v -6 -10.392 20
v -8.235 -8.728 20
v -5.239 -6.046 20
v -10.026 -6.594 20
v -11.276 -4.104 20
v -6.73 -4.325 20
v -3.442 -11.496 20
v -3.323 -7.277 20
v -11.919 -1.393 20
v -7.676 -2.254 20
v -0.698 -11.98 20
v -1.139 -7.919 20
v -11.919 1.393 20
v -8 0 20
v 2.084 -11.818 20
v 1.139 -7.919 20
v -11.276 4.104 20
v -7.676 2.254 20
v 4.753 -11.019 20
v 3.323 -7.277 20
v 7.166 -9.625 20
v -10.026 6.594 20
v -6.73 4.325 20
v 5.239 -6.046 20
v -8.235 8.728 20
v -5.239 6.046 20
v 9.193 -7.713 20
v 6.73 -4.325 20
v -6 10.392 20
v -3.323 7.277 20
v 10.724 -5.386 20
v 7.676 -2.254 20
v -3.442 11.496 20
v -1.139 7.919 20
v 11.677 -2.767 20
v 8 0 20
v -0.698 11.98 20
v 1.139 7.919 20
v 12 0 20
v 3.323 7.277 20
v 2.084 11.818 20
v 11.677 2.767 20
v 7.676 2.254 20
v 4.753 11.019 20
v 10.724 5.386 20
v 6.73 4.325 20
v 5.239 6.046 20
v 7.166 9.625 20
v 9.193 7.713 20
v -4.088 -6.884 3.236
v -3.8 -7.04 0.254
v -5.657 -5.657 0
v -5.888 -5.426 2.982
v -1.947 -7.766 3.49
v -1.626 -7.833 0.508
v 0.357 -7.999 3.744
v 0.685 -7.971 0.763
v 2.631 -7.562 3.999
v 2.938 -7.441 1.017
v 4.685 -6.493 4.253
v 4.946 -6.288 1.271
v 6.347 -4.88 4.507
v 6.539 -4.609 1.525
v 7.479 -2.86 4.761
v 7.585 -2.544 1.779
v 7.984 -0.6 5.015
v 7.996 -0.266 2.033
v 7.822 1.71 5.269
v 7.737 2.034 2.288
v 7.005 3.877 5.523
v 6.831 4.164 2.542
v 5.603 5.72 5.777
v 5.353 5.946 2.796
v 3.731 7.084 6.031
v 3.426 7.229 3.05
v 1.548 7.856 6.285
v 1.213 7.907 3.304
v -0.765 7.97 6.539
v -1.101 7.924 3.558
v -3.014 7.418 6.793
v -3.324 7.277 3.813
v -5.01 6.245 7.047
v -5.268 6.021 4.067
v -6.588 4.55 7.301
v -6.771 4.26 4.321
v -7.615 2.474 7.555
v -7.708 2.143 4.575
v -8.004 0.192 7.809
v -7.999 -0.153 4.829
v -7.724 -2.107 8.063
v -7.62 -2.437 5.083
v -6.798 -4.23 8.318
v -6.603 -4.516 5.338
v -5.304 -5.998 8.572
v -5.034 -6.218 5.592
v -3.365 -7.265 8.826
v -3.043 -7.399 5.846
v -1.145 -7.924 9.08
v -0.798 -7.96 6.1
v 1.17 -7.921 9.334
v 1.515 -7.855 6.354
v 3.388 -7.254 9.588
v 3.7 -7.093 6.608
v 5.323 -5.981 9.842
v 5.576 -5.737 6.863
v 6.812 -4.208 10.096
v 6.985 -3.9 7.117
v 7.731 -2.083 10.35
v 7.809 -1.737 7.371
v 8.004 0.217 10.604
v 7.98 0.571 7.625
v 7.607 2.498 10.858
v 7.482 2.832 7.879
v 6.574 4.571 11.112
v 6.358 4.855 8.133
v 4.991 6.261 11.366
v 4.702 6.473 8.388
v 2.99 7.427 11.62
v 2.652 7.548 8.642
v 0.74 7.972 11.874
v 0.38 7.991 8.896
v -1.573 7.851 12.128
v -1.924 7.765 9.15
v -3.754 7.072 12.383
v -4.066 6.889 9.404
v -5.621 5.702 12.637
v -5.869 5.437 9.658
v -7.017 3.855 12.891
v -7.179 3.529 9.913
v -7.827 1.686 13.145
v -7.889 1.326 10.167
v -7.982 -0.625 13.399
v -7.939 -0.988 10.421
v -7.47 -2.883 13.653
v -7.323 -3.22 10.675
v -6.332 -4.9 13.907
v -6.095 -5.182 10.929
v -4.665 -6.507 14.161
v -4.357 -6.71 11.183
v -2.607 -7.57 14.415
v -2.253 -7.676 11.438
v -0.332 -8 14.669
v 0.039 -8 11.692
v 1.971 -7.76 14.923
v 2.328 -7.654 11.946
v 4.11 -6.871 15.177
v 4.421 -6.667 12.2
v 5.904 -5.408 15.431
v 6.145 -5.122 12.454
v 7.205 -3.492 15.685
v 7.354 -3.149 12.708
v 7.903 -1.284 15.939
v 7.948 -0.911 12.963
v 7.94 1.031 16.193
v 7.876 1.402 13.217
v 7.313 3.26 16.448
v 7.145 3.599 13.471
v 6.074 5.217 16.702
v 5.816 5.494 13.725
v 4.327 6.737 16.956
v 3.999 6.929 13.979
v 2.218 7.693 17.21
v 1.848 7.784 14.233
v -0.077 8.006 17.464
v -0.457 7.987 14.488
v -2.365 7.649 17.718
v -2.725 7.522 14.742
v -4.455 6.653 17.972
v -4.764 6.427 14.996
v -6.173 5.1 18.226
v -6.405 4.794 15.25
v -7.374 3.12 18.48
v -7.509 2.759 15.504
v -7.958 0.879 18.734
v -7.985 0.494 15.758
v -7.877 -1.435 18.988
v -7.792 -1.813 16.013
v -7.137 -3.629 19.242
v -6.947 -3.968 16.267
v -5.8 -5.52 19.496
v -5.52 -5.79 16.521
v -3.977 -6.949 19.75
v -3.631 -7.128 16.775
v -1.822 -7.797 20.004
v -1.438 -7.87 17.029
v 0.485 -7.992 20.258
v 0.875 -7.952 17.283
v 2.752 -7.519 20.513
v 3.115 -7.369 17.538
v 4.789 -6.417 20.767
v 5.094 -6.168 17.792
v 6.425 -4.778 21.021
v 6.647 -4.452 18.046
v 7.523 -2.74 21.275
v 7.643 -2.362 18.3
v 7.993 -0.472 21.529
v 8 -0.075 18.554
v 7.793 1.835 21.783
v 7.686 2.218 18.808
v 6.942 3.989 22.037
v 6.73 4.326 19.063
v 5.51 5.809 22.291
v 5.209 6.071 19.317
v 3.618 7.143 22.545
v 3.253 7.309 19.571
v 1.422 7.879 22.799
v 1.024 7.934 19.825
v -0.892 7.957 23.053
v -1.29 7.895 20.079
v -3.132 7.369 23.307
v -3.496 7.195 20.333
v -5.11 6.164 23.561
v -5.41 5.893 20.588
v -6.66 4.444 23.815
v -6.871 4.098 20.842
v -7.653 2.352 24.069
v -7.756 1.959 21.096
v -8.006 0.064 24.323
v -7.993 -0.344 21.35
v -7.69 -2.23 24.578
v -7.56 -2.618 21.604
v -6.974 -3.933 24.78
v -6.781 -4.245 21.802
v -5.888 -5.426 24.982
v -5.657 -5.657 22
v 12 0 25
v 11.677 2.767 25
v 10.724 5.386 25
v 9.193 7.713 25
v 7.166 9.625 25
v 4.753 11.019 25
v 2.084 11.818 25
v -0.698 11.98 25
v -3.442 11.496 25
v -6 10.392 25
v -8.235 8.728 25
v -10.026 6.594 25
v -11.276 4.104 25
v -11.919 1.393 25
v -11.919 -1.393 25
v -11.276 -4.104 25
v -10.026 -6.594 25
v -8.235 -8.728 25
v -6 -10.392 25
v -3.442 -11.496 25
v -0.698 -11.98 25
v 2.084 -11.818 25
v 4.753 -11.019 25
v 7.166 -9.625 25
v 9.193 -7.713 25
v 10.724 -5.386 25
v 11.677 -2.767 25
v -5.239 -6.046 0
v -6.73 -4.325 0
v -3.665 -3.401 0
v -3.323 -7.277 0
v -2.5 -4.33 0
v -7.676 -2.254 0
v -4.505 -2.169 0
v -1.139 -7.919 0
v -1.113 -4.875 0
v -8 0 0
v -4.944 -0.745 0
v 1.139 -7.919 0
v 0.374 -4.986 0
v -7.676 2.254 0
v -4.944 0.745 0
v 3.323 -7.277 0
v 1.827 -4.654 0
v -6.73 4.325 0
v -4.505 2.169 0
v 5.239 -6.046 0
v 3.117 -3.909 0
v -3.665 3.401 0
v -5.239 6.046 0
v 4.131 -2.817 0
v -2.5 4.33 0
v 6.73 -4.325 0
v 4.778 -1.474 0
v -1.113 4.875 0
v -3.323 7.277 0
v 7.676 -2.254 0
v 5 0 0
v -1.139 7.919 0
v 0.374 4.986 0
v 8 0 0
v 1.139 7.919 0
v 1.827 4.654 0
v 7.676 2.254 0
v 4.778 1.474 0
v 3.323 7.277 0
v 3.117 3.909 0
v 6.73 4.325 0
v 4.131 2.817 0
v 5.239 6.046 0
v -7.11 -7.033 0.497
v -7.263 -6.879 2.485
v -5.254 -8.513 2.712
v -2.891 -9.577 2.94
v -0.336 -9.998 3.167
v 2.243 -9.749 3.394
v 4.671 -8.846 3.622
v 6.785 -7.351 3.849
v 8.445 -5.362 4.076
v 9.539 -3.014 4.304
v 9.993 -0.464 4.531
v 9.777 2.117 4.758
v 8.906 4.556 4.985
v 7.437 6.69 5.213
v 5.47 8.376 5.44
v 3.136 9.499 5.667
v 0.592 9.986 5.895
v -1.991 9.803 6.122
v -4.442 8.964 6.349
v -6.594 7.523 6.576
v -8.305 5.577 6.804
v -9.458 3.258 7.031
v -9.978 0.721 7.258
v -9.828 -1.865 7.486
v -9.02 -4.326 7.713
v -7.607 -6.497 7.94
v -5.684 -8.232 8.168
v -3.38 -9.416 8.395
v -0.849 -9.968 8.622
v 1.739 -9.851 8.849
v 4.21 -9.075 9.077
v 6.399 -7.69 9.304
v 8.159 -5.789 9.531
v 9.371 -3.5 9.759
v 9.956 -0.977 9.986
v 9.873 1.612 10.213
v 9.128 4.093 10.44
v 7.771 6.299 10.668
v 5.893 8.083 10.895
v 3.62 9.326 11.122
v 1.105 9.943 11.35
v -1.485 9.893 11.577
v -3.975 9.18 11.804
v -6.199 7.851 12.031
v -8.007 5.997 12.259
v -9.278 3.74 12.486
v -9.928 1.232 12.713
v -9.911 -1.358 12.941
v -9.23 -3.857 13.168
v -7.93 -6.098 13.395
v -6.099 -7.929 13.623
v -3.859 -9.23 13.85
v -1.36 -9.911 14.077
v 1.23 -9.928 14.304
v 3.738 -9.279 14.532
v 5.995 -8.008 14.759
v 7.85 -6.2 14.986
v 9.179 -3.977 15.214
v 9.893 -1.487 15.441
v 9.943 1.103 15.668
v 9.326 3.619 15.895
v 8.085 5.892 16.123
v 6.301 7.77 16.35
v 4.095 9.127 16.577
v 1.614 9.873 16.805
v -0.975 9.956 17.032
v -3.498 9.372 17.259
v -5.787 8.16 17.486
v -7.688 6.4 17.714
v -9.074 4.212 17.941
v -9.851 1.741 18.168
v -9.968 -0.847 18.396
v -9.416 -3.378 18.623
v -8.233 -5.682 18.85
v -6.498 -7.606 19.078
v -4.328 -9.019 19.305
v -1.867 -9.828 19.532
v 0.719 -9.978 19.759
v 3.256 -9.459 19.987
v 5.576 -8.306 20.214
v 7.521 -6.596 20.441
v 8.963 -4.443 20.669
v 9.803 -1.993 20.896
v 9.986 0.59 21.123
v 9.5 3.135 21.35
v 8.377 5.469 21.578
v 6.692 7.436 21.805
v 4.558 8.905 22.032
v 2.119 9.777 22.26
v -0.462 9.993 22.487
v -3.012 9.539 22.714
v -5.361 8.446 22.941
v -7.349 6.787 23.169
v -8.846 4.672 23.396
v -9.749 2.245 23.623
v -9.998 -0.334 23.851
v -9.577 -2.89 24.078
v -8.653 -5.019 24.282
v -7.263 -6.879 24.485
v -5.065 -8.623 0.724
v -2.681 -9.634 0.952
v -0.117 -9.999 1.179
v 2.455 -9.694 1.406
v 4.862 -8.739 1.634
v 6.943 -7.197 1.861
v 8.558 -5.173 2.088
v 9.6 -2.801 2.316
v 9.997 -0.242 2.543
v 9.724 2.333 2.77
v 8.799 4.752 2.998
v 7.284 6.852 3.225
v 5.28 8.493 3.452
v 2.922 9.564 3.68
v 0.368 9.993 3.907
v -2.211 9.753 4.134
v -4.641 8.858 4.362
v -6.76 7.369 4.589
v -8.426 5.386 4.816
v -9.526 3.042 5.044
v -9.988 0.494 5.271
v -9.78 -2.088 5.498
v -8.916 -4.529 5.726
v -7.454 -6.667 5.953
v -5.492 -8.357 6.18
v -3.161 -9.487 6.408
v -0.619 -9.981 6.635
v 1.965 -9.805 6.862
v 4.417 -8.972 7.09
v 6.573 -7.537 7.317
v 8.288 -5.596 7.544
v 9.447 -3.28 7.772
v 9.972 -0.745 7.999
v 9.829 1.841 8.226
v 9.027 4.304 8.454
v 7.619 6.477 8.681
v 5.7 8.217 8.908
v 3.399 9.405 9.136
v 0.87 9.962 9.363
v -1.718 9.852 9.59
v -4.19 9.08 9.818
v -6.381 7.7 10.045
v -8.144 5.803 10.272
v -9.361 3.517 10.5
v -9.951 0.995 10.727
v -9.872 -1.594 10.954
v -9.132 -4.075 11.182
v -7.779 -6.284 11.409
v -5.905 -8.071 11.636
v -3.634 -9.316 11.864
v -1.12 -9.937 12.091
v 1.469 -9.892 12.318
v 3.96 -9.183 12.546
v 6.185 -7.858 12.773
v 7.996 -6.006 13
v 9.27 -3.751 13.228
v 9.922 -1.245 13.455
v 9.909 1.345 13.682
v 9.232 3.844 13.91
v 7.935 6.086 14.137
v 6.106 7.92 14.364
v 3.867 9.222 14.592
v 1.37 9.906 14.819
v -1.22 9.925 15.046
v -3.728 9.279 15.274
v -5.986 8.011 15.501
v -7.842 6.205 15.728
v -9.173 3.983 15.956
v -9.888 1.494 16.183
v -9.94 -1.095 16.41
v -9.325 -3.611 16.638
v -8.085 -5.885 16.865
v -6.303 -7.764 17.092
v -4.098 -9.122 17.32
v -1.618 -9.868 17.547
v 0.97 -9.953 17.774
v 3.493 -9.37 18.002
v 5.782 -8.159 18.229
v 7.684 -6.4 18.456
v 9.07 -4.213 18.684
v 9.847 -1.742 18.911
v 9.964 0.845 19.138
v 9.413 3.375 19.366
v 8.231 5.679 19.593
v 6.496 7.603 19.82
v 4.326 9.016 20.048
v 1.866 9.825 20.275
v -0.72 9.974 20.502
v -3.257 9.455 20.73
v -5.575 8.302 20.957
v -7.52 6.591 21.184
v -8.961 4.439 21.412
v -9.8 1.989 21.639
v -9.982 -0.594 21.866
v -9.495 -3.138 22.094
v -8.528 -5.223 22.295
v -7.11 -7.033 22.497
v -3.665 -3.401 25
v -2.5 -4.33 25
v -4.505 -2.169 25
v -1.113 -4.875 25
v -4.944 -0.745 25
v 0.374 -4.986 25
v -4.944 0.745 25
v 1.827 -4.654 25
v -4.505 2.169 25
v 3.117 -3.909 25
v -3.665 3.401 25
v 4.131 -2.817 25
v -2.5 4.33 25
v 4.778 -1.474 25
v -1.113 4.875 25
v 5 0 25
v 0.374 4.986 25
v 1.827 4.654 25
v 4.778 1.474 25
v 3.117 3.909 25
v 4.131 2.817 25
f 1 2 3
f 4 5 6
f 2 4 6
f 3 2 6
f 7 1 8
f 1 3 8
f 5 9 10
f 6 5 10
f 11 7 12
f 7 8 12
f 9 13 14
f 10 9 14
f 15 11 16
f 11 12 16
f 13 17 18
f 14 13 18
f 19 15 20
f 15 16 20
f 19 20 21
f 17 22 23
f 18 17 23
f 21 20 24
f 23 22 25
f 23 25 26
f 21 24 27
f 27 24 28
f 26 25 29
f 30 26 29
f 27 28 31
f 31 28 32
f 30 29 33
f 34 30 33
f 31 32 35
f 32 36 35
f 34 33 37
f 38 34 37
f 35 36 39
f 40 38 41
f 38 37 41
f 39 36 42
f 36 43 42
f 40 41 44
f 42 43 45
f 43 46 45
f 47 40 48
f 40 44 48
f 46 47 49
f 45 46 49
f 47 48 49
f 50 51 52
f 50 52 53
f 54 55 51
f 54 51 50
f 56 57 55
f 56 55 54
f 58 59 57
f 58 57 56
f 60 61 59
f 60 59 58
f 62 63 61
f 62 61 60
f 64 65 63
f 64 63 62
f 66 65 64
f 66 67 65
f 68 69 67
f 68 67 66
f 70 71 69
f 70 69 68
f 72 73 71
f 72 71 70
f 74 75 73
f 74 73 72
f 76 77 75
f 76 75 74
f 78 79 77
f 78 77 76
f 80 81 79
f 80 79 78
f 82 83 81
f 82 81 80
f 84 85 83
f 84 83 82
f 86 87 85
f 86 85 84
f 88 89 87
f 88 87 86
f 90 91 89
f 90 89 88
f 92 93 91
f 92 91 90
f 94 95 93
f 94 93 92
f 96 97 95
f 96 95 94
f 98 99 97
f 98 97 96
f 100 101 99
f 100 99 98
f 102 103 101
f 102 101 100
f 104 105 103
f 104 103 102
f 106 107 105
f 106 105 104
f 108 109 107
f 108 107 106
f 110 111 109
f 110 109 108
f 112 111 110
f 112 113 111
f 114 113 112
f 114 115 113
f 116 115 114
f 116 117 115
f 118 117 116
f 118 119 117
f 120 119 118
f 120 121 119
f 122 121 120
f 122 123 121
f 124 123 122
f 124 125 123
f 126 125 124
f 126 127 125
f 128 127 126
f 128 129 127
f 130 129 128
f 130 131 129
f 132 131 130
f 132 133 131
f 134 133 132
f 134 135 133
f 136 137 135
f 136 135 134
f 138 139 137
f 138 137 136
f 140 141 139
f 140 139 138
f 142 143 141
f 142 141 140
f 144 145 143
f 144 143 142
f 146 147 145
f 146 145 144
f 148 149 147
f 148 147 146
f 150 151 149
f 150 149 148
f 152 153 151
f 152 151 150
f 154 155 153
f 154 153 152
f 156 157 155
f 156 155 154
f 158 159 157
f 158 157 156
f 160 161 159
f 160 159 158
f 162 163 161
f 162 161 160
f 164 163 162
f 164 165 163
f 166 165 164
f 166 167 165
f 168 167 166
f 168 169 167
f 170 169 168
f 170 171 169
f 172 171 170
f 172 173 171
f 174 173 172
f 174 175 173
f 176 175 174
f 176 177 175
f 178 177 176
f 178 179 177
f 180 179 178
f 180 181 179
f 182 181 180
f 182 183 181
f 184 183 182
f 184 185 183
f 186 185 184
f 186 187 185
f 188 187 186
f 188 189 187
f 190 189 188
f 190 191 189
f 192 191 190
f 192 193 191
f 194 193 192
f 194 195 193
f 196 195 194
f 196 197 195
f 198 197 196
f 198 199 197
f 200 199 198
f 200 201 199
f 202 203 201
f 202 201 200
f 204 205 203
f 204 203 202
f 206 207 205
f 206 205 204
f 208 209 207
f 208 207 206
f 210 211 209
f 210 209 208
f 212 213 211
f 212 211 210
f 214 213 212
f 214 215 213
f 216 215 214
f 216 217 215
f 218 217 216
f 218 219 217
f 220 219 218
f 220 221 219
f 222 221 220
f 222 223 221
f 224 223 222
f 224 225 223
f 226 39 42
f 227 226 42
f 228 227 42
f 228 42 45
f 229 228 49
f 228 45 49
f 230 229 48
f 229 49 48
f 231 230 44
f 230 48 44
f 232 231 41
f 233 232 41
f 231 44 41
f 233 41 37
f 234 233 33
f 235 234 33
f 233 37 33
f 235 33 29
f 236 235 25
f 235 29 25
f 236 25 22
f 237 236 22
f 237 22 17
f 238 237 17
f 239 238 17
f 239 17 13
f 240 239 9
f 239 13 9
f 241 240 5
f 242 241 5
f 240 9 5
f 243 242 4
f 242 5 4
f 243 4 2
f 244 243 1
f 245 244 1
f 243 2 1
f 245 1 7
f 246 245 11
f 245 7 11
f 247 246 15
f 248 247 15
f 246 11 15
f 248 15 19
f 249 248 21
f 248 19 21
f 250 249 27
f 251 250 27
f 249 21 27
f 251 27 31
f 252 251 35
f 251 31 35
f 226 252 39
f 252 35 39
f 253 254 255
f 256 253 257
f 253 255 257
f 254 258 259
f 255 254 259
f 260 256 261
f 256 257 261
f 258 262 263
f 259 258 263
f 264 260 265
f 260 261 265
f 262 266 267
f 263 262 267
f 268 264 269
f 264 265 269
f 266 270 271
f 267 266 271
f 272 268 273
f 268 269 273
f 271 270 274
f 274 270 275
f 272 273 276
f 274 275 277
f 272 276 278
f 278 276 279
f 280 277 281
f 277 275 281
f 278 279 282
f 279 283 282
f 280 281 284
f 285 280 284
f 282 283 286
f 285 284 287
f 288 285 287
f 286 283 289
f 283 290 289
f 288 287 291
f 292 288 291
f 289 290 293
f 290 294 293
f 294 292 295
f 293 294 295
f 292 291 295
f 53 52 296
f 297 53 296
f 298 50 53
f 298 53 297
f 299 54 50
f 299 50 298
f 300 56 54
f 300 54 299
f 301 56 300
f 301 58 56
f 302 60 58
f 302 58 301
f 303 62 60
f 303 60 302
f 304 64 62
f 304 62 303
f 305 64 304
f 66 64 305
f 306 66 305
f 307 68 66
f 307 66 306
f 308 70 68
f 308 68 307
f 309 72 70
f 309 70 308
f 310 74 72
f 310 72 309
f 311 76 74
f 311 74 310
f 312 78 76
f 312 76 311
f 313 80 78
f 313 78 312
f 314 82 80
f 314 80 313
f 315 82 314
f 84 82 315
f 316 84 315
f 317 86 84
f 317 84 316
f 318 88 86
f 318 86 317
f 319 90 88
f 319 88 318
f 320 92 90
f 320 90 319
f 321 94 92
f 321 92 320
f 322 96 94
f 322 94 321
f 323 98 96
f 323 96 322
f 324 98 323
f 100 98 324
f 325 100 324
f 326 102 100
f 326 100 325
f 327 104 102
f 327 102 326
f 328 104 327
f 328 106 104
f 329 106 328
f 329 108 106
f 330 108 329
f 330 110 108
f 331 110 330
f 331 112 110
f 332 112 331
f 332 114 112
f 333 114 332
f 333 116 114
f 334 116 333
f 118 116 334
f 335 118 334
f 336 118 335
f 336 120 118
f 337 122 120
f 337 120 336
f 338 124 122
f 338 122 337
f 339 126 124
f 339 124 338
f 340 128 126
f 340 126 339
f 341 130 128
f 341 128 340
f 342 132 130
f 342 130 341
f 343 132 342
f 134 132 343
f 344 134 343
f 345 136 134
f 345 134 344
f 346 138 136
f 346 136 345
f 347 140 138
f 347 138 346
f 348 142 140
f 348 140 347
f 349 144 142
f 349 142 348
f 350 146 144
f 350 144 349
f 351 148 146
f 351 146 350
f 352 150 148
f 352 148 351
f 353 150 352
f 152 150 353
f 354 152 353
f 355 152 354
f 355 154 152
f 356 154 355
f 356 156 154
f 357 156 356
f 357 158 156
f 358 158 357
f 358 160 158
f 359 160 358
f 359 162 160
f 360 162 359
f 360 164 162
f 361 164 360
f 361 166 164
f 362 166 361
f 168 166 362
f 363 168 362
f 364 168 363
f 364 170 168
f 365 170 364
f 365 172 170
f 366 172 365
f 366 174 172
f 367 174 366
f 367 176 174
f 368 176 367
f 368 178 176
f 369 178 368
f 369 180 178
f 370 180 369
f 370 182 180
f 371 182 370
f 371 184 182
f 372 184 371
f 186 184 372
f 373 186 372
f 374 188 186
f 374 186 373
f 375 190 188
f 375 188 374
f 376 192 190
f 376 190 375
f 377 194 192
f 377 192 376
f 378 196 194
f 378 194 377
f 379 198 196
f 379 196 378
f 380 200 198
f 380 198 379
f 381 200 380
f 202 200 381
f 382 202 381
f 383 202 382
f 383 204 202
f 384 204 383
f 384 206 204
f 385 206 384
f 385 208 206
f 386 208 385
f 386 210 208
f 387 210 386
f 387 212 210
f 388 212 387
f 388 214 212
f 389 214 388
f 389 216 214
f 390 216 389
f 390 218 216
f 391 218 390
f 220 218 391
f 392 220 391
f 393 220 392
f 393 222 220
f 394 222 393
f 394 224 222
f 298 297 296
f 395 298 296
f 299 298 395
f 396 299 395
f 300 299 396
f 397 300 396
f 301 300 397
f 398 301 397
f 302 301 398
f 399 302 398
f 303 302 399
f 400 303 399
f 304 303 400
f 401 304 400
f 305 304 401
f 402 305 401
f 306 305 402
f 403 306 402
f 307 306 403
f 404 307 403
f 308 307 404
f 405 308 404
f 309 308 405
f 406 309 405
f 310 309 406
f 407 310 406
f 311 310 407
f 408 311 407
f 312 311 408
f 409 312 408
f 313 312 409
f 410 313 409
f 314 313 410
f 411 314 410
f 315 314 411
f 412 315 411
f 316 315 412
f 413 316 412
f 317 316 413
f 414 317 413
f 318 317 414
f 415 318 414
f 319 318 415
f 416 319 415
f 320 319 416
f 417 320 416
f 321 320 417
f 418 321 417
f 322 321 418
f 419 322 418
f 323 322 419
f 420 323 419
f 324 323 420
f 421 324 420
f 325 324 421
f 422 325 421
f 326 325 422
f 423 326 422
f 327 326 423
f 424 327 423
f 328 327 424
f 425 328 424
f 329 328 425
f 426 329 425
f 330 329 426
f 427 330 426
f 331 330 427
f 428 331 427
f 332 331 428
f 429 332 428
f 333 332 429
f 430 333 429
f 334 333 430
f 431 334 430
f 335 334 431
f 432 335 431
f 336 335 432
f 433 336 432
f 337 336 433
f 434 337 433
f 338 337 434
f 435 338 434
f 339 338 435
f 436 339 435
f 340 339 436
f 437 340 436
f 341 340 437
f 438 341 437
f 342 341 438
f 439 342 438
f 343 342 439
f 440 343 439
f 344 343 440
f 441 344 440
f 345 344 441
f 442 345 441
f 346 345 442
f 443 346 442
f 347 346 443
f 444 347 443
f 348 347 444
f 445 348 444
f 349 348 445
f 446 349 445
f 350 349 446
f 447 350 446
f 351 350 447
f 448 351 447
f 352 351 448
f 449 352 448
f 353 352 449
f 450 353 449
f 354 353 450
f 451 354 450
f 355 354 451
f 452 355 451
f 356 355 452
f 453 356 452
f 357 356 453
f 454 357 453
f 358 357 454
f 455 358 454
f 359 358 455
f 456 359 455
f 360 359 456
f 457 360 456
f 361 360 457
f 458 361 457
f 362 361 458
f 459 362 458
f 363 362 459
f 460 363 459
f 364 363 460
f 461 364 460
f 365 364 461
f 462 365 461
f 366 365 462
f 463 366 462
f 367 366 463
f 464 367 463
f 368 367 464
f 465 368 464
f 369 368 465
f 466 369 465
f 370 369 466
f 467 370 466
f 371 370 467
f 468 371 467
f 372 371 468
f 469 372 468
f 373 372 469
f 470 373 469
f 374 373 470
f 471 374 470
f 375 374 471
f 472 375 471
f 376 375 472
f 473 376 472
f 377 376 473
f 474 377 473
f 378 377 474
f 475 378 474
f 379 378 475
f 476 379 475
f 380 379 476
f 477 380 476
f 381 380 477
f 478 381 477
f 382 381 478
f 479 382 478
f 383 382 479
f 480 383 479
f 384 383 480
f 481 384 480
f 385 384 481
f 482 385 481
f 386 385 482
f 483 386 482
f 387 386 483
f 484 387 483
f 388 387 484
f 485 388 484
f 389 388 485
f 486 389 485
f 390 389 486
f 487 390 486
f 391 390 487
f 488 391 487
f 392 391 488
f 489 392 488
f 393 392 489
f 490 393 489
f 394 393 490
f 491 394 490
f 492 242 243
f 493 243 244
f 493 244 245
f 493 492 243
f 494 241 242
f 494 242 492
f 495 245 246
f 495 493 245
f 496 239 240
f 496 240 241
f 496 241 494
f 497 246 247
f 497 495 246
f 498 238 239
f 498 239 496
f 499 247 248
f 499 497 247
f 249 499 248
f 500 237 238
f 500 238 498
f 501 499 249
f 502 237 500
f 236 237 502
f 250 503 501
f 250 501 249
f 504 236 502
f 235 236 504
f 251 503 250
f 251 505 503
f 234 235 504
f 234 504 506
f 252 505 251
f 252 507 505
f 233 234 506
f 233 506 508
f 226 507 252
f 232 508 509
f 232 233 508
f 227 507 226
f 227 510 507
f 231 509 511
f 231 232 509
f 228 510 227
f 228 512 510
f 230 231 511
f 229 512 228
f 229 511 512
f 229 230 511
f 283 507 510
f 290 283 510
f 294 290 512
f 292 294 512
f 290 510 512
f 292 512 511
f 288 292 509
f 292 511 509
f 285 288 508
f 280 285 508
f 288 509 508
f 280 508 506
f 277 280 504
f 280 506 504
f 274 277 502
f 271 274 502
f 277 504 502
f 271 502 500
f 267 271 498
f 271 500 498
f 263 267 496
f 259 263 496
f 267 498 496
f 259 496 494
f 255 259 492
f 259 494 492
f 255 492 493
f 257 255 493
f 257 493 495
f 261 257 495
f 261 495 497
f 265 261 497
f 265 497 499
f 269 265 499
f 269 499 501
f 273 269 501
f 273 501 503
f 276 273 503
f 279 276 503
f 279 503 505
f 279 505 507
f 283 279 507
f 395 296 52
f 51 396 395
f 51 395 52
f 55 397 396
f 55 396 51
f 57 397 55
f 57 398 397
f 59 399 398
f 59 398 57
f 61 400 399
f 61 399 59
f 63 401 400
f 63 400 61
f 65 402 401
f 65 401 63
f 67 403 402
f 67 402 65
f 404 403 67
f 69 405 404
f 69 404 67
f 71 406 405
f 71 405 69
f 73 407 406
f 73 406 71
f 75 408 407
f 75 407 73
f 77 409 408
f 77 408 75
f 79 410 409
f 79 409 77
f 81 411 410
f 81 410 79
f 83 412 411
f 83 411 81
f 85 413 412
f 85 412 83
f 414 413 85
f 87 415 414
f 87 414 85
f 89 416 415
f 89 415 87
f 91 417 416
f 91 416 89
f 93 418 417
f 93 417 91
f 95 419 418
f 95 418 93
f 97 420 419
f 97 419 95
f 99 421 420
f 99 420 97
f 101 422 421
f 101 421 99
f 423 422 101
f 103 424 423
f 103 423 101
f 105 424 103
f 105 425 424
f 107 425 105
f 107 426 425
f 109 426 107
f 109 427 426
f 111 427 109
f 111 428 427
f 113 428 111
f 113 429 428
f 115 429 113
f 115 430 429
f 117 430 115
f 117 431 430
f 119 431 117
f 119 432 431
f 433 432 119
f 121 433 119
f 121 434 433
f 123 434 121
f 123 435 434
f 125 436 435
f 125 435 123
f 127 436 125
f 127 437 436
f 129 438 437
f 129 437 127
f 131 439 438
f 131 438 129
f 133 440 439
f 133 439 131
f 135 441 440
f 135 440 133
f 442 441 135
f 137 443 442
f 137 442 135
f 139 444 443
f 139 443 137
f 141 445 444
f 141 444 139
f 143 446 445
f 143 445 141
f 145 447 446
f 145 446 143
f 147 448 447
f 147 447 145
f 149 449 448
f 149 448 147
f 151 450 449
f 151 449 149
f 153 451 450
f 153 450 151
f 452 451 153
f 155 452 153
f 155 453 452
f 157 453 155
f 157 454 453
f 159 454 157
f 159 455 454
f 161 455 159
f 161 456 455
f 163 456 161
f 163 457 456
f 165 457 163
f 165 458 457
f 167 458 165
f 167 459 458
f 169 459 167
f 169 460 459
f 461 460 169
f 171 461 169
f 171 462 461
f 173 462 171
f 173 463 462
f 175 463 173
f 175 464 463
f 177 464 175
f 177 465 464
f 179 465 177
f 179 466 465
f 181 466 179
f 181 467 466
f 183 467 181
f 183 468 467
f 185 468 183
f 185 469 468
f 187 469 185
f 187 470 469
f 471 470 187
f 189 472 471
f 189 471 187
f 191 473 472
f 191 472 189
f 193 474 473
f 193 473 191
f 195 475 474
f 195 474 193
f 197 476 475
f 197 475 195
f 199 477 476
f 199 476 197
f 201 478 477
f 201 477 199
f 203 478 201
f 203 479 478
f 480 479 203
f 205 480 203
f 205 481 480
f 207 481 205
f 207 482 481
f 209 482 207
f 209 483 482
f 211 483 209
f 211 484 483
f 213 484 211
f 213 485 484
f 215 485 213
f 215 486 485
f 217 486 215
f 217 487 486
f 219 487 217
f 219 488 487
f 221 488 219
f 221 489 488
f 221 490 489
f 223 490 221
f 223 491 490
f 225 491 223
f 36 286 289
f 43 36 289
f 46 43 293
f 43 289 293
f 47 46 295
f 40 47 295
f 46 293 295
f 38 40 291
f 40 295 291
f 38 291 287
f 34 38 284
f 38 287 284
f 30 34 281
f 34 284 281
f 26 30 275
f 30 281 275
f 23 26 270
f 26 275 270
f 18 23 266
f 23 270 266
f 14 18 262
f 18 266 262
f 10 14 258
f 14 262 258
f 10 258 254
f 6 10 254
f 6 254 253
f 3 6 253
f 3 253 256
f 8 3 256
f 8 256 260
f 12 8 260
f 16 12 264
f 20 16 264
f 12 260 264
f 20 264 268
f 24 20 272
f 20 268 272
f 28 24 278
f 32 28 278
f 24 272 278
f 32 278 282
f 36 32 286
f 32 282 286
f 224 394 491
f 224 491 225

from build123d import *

# Parameters (mm, degrees)
SKETCH_5_R               = 8
EXTRUDE_3_DEPTH          = 20
SKETCH_7_R               = 12
EXTRUDE_4_DEPTH          = 5
SWEEP_2_PITCH            = 5.5
SWEEP_2_HEIGHT           = 22
SWEEP_2_RADIUS           = 8
SWEEP_2_START_ANGLE      = -135
SKETCH_9_R               = 5
CUT_EXTRUDE_1_DEPTH      = 5
CUT_EXTRUDE_1_DEPTH_BACK = 35


with BuildPart() as part:
    # 草图5 → 凸台-拉伸3 (new body)
    with BuildSketch(Plane.XY):
        Circle(SKETCH_5_R)
    extrude(amount=EXTRUDE_3_DEPTH)

    # 草图7 → 凸台-拉伸4 (add)
    with BuildSketch(Plane.XY.offset(20)):
        Circle(SKETCH_7_R)
    extrude(amount=EXTRUDE_4_DEPTH)

    # 草图9 → 切除-拉伸1 (cut, two sides)
    with BuildSketch(Plane.XY.offset(25)) as cut_extrude_1_sk:
        Circle(SKETCH_9_R)
    extrude(amount=CUT_EXTRUDE_1_DEPTH, mode=Mode.SUBTRACT)
    extrude(cut_extrude_1_sk.sketch, amount=-CUT_EXTRUDE_1_DEPTH_BACK, mode=Mode.SUBTRACT)


with BuildPart() as body_2:
    # 扫描2: sweep along a helix
    with BuildLine() as sweep_2_path:
        add(Helix(SWEEP_2_PITCH, SWEEP_2_HEIGHT, SWEEP_2_RADIUS, center=(0, 0, 0), direction=(0, 0, 1), mode=Mode.PRIVATE).rotate(Axis((0, 0, 0), (0, 0, 1)), SWEEP_2_START_ANGLE))
    # 草图8 → 扫描2 (sweep)
    with BuildSketch(Plane(origin=(-5.656854249, -5.656854249, 0), x_dir=(0.076911889, -0.076911889, -0.994066961), z_dir=(0.702911489, -0.702911489, 0.108769836))):
        Polygon((0, 0), (-3, 0), (-2.5, -2), (-0.5, -2), align=None)
    sweep(path=sweep_2_path.line, is_frenet=True)


solid = Compound([part.part, body_2.part])
